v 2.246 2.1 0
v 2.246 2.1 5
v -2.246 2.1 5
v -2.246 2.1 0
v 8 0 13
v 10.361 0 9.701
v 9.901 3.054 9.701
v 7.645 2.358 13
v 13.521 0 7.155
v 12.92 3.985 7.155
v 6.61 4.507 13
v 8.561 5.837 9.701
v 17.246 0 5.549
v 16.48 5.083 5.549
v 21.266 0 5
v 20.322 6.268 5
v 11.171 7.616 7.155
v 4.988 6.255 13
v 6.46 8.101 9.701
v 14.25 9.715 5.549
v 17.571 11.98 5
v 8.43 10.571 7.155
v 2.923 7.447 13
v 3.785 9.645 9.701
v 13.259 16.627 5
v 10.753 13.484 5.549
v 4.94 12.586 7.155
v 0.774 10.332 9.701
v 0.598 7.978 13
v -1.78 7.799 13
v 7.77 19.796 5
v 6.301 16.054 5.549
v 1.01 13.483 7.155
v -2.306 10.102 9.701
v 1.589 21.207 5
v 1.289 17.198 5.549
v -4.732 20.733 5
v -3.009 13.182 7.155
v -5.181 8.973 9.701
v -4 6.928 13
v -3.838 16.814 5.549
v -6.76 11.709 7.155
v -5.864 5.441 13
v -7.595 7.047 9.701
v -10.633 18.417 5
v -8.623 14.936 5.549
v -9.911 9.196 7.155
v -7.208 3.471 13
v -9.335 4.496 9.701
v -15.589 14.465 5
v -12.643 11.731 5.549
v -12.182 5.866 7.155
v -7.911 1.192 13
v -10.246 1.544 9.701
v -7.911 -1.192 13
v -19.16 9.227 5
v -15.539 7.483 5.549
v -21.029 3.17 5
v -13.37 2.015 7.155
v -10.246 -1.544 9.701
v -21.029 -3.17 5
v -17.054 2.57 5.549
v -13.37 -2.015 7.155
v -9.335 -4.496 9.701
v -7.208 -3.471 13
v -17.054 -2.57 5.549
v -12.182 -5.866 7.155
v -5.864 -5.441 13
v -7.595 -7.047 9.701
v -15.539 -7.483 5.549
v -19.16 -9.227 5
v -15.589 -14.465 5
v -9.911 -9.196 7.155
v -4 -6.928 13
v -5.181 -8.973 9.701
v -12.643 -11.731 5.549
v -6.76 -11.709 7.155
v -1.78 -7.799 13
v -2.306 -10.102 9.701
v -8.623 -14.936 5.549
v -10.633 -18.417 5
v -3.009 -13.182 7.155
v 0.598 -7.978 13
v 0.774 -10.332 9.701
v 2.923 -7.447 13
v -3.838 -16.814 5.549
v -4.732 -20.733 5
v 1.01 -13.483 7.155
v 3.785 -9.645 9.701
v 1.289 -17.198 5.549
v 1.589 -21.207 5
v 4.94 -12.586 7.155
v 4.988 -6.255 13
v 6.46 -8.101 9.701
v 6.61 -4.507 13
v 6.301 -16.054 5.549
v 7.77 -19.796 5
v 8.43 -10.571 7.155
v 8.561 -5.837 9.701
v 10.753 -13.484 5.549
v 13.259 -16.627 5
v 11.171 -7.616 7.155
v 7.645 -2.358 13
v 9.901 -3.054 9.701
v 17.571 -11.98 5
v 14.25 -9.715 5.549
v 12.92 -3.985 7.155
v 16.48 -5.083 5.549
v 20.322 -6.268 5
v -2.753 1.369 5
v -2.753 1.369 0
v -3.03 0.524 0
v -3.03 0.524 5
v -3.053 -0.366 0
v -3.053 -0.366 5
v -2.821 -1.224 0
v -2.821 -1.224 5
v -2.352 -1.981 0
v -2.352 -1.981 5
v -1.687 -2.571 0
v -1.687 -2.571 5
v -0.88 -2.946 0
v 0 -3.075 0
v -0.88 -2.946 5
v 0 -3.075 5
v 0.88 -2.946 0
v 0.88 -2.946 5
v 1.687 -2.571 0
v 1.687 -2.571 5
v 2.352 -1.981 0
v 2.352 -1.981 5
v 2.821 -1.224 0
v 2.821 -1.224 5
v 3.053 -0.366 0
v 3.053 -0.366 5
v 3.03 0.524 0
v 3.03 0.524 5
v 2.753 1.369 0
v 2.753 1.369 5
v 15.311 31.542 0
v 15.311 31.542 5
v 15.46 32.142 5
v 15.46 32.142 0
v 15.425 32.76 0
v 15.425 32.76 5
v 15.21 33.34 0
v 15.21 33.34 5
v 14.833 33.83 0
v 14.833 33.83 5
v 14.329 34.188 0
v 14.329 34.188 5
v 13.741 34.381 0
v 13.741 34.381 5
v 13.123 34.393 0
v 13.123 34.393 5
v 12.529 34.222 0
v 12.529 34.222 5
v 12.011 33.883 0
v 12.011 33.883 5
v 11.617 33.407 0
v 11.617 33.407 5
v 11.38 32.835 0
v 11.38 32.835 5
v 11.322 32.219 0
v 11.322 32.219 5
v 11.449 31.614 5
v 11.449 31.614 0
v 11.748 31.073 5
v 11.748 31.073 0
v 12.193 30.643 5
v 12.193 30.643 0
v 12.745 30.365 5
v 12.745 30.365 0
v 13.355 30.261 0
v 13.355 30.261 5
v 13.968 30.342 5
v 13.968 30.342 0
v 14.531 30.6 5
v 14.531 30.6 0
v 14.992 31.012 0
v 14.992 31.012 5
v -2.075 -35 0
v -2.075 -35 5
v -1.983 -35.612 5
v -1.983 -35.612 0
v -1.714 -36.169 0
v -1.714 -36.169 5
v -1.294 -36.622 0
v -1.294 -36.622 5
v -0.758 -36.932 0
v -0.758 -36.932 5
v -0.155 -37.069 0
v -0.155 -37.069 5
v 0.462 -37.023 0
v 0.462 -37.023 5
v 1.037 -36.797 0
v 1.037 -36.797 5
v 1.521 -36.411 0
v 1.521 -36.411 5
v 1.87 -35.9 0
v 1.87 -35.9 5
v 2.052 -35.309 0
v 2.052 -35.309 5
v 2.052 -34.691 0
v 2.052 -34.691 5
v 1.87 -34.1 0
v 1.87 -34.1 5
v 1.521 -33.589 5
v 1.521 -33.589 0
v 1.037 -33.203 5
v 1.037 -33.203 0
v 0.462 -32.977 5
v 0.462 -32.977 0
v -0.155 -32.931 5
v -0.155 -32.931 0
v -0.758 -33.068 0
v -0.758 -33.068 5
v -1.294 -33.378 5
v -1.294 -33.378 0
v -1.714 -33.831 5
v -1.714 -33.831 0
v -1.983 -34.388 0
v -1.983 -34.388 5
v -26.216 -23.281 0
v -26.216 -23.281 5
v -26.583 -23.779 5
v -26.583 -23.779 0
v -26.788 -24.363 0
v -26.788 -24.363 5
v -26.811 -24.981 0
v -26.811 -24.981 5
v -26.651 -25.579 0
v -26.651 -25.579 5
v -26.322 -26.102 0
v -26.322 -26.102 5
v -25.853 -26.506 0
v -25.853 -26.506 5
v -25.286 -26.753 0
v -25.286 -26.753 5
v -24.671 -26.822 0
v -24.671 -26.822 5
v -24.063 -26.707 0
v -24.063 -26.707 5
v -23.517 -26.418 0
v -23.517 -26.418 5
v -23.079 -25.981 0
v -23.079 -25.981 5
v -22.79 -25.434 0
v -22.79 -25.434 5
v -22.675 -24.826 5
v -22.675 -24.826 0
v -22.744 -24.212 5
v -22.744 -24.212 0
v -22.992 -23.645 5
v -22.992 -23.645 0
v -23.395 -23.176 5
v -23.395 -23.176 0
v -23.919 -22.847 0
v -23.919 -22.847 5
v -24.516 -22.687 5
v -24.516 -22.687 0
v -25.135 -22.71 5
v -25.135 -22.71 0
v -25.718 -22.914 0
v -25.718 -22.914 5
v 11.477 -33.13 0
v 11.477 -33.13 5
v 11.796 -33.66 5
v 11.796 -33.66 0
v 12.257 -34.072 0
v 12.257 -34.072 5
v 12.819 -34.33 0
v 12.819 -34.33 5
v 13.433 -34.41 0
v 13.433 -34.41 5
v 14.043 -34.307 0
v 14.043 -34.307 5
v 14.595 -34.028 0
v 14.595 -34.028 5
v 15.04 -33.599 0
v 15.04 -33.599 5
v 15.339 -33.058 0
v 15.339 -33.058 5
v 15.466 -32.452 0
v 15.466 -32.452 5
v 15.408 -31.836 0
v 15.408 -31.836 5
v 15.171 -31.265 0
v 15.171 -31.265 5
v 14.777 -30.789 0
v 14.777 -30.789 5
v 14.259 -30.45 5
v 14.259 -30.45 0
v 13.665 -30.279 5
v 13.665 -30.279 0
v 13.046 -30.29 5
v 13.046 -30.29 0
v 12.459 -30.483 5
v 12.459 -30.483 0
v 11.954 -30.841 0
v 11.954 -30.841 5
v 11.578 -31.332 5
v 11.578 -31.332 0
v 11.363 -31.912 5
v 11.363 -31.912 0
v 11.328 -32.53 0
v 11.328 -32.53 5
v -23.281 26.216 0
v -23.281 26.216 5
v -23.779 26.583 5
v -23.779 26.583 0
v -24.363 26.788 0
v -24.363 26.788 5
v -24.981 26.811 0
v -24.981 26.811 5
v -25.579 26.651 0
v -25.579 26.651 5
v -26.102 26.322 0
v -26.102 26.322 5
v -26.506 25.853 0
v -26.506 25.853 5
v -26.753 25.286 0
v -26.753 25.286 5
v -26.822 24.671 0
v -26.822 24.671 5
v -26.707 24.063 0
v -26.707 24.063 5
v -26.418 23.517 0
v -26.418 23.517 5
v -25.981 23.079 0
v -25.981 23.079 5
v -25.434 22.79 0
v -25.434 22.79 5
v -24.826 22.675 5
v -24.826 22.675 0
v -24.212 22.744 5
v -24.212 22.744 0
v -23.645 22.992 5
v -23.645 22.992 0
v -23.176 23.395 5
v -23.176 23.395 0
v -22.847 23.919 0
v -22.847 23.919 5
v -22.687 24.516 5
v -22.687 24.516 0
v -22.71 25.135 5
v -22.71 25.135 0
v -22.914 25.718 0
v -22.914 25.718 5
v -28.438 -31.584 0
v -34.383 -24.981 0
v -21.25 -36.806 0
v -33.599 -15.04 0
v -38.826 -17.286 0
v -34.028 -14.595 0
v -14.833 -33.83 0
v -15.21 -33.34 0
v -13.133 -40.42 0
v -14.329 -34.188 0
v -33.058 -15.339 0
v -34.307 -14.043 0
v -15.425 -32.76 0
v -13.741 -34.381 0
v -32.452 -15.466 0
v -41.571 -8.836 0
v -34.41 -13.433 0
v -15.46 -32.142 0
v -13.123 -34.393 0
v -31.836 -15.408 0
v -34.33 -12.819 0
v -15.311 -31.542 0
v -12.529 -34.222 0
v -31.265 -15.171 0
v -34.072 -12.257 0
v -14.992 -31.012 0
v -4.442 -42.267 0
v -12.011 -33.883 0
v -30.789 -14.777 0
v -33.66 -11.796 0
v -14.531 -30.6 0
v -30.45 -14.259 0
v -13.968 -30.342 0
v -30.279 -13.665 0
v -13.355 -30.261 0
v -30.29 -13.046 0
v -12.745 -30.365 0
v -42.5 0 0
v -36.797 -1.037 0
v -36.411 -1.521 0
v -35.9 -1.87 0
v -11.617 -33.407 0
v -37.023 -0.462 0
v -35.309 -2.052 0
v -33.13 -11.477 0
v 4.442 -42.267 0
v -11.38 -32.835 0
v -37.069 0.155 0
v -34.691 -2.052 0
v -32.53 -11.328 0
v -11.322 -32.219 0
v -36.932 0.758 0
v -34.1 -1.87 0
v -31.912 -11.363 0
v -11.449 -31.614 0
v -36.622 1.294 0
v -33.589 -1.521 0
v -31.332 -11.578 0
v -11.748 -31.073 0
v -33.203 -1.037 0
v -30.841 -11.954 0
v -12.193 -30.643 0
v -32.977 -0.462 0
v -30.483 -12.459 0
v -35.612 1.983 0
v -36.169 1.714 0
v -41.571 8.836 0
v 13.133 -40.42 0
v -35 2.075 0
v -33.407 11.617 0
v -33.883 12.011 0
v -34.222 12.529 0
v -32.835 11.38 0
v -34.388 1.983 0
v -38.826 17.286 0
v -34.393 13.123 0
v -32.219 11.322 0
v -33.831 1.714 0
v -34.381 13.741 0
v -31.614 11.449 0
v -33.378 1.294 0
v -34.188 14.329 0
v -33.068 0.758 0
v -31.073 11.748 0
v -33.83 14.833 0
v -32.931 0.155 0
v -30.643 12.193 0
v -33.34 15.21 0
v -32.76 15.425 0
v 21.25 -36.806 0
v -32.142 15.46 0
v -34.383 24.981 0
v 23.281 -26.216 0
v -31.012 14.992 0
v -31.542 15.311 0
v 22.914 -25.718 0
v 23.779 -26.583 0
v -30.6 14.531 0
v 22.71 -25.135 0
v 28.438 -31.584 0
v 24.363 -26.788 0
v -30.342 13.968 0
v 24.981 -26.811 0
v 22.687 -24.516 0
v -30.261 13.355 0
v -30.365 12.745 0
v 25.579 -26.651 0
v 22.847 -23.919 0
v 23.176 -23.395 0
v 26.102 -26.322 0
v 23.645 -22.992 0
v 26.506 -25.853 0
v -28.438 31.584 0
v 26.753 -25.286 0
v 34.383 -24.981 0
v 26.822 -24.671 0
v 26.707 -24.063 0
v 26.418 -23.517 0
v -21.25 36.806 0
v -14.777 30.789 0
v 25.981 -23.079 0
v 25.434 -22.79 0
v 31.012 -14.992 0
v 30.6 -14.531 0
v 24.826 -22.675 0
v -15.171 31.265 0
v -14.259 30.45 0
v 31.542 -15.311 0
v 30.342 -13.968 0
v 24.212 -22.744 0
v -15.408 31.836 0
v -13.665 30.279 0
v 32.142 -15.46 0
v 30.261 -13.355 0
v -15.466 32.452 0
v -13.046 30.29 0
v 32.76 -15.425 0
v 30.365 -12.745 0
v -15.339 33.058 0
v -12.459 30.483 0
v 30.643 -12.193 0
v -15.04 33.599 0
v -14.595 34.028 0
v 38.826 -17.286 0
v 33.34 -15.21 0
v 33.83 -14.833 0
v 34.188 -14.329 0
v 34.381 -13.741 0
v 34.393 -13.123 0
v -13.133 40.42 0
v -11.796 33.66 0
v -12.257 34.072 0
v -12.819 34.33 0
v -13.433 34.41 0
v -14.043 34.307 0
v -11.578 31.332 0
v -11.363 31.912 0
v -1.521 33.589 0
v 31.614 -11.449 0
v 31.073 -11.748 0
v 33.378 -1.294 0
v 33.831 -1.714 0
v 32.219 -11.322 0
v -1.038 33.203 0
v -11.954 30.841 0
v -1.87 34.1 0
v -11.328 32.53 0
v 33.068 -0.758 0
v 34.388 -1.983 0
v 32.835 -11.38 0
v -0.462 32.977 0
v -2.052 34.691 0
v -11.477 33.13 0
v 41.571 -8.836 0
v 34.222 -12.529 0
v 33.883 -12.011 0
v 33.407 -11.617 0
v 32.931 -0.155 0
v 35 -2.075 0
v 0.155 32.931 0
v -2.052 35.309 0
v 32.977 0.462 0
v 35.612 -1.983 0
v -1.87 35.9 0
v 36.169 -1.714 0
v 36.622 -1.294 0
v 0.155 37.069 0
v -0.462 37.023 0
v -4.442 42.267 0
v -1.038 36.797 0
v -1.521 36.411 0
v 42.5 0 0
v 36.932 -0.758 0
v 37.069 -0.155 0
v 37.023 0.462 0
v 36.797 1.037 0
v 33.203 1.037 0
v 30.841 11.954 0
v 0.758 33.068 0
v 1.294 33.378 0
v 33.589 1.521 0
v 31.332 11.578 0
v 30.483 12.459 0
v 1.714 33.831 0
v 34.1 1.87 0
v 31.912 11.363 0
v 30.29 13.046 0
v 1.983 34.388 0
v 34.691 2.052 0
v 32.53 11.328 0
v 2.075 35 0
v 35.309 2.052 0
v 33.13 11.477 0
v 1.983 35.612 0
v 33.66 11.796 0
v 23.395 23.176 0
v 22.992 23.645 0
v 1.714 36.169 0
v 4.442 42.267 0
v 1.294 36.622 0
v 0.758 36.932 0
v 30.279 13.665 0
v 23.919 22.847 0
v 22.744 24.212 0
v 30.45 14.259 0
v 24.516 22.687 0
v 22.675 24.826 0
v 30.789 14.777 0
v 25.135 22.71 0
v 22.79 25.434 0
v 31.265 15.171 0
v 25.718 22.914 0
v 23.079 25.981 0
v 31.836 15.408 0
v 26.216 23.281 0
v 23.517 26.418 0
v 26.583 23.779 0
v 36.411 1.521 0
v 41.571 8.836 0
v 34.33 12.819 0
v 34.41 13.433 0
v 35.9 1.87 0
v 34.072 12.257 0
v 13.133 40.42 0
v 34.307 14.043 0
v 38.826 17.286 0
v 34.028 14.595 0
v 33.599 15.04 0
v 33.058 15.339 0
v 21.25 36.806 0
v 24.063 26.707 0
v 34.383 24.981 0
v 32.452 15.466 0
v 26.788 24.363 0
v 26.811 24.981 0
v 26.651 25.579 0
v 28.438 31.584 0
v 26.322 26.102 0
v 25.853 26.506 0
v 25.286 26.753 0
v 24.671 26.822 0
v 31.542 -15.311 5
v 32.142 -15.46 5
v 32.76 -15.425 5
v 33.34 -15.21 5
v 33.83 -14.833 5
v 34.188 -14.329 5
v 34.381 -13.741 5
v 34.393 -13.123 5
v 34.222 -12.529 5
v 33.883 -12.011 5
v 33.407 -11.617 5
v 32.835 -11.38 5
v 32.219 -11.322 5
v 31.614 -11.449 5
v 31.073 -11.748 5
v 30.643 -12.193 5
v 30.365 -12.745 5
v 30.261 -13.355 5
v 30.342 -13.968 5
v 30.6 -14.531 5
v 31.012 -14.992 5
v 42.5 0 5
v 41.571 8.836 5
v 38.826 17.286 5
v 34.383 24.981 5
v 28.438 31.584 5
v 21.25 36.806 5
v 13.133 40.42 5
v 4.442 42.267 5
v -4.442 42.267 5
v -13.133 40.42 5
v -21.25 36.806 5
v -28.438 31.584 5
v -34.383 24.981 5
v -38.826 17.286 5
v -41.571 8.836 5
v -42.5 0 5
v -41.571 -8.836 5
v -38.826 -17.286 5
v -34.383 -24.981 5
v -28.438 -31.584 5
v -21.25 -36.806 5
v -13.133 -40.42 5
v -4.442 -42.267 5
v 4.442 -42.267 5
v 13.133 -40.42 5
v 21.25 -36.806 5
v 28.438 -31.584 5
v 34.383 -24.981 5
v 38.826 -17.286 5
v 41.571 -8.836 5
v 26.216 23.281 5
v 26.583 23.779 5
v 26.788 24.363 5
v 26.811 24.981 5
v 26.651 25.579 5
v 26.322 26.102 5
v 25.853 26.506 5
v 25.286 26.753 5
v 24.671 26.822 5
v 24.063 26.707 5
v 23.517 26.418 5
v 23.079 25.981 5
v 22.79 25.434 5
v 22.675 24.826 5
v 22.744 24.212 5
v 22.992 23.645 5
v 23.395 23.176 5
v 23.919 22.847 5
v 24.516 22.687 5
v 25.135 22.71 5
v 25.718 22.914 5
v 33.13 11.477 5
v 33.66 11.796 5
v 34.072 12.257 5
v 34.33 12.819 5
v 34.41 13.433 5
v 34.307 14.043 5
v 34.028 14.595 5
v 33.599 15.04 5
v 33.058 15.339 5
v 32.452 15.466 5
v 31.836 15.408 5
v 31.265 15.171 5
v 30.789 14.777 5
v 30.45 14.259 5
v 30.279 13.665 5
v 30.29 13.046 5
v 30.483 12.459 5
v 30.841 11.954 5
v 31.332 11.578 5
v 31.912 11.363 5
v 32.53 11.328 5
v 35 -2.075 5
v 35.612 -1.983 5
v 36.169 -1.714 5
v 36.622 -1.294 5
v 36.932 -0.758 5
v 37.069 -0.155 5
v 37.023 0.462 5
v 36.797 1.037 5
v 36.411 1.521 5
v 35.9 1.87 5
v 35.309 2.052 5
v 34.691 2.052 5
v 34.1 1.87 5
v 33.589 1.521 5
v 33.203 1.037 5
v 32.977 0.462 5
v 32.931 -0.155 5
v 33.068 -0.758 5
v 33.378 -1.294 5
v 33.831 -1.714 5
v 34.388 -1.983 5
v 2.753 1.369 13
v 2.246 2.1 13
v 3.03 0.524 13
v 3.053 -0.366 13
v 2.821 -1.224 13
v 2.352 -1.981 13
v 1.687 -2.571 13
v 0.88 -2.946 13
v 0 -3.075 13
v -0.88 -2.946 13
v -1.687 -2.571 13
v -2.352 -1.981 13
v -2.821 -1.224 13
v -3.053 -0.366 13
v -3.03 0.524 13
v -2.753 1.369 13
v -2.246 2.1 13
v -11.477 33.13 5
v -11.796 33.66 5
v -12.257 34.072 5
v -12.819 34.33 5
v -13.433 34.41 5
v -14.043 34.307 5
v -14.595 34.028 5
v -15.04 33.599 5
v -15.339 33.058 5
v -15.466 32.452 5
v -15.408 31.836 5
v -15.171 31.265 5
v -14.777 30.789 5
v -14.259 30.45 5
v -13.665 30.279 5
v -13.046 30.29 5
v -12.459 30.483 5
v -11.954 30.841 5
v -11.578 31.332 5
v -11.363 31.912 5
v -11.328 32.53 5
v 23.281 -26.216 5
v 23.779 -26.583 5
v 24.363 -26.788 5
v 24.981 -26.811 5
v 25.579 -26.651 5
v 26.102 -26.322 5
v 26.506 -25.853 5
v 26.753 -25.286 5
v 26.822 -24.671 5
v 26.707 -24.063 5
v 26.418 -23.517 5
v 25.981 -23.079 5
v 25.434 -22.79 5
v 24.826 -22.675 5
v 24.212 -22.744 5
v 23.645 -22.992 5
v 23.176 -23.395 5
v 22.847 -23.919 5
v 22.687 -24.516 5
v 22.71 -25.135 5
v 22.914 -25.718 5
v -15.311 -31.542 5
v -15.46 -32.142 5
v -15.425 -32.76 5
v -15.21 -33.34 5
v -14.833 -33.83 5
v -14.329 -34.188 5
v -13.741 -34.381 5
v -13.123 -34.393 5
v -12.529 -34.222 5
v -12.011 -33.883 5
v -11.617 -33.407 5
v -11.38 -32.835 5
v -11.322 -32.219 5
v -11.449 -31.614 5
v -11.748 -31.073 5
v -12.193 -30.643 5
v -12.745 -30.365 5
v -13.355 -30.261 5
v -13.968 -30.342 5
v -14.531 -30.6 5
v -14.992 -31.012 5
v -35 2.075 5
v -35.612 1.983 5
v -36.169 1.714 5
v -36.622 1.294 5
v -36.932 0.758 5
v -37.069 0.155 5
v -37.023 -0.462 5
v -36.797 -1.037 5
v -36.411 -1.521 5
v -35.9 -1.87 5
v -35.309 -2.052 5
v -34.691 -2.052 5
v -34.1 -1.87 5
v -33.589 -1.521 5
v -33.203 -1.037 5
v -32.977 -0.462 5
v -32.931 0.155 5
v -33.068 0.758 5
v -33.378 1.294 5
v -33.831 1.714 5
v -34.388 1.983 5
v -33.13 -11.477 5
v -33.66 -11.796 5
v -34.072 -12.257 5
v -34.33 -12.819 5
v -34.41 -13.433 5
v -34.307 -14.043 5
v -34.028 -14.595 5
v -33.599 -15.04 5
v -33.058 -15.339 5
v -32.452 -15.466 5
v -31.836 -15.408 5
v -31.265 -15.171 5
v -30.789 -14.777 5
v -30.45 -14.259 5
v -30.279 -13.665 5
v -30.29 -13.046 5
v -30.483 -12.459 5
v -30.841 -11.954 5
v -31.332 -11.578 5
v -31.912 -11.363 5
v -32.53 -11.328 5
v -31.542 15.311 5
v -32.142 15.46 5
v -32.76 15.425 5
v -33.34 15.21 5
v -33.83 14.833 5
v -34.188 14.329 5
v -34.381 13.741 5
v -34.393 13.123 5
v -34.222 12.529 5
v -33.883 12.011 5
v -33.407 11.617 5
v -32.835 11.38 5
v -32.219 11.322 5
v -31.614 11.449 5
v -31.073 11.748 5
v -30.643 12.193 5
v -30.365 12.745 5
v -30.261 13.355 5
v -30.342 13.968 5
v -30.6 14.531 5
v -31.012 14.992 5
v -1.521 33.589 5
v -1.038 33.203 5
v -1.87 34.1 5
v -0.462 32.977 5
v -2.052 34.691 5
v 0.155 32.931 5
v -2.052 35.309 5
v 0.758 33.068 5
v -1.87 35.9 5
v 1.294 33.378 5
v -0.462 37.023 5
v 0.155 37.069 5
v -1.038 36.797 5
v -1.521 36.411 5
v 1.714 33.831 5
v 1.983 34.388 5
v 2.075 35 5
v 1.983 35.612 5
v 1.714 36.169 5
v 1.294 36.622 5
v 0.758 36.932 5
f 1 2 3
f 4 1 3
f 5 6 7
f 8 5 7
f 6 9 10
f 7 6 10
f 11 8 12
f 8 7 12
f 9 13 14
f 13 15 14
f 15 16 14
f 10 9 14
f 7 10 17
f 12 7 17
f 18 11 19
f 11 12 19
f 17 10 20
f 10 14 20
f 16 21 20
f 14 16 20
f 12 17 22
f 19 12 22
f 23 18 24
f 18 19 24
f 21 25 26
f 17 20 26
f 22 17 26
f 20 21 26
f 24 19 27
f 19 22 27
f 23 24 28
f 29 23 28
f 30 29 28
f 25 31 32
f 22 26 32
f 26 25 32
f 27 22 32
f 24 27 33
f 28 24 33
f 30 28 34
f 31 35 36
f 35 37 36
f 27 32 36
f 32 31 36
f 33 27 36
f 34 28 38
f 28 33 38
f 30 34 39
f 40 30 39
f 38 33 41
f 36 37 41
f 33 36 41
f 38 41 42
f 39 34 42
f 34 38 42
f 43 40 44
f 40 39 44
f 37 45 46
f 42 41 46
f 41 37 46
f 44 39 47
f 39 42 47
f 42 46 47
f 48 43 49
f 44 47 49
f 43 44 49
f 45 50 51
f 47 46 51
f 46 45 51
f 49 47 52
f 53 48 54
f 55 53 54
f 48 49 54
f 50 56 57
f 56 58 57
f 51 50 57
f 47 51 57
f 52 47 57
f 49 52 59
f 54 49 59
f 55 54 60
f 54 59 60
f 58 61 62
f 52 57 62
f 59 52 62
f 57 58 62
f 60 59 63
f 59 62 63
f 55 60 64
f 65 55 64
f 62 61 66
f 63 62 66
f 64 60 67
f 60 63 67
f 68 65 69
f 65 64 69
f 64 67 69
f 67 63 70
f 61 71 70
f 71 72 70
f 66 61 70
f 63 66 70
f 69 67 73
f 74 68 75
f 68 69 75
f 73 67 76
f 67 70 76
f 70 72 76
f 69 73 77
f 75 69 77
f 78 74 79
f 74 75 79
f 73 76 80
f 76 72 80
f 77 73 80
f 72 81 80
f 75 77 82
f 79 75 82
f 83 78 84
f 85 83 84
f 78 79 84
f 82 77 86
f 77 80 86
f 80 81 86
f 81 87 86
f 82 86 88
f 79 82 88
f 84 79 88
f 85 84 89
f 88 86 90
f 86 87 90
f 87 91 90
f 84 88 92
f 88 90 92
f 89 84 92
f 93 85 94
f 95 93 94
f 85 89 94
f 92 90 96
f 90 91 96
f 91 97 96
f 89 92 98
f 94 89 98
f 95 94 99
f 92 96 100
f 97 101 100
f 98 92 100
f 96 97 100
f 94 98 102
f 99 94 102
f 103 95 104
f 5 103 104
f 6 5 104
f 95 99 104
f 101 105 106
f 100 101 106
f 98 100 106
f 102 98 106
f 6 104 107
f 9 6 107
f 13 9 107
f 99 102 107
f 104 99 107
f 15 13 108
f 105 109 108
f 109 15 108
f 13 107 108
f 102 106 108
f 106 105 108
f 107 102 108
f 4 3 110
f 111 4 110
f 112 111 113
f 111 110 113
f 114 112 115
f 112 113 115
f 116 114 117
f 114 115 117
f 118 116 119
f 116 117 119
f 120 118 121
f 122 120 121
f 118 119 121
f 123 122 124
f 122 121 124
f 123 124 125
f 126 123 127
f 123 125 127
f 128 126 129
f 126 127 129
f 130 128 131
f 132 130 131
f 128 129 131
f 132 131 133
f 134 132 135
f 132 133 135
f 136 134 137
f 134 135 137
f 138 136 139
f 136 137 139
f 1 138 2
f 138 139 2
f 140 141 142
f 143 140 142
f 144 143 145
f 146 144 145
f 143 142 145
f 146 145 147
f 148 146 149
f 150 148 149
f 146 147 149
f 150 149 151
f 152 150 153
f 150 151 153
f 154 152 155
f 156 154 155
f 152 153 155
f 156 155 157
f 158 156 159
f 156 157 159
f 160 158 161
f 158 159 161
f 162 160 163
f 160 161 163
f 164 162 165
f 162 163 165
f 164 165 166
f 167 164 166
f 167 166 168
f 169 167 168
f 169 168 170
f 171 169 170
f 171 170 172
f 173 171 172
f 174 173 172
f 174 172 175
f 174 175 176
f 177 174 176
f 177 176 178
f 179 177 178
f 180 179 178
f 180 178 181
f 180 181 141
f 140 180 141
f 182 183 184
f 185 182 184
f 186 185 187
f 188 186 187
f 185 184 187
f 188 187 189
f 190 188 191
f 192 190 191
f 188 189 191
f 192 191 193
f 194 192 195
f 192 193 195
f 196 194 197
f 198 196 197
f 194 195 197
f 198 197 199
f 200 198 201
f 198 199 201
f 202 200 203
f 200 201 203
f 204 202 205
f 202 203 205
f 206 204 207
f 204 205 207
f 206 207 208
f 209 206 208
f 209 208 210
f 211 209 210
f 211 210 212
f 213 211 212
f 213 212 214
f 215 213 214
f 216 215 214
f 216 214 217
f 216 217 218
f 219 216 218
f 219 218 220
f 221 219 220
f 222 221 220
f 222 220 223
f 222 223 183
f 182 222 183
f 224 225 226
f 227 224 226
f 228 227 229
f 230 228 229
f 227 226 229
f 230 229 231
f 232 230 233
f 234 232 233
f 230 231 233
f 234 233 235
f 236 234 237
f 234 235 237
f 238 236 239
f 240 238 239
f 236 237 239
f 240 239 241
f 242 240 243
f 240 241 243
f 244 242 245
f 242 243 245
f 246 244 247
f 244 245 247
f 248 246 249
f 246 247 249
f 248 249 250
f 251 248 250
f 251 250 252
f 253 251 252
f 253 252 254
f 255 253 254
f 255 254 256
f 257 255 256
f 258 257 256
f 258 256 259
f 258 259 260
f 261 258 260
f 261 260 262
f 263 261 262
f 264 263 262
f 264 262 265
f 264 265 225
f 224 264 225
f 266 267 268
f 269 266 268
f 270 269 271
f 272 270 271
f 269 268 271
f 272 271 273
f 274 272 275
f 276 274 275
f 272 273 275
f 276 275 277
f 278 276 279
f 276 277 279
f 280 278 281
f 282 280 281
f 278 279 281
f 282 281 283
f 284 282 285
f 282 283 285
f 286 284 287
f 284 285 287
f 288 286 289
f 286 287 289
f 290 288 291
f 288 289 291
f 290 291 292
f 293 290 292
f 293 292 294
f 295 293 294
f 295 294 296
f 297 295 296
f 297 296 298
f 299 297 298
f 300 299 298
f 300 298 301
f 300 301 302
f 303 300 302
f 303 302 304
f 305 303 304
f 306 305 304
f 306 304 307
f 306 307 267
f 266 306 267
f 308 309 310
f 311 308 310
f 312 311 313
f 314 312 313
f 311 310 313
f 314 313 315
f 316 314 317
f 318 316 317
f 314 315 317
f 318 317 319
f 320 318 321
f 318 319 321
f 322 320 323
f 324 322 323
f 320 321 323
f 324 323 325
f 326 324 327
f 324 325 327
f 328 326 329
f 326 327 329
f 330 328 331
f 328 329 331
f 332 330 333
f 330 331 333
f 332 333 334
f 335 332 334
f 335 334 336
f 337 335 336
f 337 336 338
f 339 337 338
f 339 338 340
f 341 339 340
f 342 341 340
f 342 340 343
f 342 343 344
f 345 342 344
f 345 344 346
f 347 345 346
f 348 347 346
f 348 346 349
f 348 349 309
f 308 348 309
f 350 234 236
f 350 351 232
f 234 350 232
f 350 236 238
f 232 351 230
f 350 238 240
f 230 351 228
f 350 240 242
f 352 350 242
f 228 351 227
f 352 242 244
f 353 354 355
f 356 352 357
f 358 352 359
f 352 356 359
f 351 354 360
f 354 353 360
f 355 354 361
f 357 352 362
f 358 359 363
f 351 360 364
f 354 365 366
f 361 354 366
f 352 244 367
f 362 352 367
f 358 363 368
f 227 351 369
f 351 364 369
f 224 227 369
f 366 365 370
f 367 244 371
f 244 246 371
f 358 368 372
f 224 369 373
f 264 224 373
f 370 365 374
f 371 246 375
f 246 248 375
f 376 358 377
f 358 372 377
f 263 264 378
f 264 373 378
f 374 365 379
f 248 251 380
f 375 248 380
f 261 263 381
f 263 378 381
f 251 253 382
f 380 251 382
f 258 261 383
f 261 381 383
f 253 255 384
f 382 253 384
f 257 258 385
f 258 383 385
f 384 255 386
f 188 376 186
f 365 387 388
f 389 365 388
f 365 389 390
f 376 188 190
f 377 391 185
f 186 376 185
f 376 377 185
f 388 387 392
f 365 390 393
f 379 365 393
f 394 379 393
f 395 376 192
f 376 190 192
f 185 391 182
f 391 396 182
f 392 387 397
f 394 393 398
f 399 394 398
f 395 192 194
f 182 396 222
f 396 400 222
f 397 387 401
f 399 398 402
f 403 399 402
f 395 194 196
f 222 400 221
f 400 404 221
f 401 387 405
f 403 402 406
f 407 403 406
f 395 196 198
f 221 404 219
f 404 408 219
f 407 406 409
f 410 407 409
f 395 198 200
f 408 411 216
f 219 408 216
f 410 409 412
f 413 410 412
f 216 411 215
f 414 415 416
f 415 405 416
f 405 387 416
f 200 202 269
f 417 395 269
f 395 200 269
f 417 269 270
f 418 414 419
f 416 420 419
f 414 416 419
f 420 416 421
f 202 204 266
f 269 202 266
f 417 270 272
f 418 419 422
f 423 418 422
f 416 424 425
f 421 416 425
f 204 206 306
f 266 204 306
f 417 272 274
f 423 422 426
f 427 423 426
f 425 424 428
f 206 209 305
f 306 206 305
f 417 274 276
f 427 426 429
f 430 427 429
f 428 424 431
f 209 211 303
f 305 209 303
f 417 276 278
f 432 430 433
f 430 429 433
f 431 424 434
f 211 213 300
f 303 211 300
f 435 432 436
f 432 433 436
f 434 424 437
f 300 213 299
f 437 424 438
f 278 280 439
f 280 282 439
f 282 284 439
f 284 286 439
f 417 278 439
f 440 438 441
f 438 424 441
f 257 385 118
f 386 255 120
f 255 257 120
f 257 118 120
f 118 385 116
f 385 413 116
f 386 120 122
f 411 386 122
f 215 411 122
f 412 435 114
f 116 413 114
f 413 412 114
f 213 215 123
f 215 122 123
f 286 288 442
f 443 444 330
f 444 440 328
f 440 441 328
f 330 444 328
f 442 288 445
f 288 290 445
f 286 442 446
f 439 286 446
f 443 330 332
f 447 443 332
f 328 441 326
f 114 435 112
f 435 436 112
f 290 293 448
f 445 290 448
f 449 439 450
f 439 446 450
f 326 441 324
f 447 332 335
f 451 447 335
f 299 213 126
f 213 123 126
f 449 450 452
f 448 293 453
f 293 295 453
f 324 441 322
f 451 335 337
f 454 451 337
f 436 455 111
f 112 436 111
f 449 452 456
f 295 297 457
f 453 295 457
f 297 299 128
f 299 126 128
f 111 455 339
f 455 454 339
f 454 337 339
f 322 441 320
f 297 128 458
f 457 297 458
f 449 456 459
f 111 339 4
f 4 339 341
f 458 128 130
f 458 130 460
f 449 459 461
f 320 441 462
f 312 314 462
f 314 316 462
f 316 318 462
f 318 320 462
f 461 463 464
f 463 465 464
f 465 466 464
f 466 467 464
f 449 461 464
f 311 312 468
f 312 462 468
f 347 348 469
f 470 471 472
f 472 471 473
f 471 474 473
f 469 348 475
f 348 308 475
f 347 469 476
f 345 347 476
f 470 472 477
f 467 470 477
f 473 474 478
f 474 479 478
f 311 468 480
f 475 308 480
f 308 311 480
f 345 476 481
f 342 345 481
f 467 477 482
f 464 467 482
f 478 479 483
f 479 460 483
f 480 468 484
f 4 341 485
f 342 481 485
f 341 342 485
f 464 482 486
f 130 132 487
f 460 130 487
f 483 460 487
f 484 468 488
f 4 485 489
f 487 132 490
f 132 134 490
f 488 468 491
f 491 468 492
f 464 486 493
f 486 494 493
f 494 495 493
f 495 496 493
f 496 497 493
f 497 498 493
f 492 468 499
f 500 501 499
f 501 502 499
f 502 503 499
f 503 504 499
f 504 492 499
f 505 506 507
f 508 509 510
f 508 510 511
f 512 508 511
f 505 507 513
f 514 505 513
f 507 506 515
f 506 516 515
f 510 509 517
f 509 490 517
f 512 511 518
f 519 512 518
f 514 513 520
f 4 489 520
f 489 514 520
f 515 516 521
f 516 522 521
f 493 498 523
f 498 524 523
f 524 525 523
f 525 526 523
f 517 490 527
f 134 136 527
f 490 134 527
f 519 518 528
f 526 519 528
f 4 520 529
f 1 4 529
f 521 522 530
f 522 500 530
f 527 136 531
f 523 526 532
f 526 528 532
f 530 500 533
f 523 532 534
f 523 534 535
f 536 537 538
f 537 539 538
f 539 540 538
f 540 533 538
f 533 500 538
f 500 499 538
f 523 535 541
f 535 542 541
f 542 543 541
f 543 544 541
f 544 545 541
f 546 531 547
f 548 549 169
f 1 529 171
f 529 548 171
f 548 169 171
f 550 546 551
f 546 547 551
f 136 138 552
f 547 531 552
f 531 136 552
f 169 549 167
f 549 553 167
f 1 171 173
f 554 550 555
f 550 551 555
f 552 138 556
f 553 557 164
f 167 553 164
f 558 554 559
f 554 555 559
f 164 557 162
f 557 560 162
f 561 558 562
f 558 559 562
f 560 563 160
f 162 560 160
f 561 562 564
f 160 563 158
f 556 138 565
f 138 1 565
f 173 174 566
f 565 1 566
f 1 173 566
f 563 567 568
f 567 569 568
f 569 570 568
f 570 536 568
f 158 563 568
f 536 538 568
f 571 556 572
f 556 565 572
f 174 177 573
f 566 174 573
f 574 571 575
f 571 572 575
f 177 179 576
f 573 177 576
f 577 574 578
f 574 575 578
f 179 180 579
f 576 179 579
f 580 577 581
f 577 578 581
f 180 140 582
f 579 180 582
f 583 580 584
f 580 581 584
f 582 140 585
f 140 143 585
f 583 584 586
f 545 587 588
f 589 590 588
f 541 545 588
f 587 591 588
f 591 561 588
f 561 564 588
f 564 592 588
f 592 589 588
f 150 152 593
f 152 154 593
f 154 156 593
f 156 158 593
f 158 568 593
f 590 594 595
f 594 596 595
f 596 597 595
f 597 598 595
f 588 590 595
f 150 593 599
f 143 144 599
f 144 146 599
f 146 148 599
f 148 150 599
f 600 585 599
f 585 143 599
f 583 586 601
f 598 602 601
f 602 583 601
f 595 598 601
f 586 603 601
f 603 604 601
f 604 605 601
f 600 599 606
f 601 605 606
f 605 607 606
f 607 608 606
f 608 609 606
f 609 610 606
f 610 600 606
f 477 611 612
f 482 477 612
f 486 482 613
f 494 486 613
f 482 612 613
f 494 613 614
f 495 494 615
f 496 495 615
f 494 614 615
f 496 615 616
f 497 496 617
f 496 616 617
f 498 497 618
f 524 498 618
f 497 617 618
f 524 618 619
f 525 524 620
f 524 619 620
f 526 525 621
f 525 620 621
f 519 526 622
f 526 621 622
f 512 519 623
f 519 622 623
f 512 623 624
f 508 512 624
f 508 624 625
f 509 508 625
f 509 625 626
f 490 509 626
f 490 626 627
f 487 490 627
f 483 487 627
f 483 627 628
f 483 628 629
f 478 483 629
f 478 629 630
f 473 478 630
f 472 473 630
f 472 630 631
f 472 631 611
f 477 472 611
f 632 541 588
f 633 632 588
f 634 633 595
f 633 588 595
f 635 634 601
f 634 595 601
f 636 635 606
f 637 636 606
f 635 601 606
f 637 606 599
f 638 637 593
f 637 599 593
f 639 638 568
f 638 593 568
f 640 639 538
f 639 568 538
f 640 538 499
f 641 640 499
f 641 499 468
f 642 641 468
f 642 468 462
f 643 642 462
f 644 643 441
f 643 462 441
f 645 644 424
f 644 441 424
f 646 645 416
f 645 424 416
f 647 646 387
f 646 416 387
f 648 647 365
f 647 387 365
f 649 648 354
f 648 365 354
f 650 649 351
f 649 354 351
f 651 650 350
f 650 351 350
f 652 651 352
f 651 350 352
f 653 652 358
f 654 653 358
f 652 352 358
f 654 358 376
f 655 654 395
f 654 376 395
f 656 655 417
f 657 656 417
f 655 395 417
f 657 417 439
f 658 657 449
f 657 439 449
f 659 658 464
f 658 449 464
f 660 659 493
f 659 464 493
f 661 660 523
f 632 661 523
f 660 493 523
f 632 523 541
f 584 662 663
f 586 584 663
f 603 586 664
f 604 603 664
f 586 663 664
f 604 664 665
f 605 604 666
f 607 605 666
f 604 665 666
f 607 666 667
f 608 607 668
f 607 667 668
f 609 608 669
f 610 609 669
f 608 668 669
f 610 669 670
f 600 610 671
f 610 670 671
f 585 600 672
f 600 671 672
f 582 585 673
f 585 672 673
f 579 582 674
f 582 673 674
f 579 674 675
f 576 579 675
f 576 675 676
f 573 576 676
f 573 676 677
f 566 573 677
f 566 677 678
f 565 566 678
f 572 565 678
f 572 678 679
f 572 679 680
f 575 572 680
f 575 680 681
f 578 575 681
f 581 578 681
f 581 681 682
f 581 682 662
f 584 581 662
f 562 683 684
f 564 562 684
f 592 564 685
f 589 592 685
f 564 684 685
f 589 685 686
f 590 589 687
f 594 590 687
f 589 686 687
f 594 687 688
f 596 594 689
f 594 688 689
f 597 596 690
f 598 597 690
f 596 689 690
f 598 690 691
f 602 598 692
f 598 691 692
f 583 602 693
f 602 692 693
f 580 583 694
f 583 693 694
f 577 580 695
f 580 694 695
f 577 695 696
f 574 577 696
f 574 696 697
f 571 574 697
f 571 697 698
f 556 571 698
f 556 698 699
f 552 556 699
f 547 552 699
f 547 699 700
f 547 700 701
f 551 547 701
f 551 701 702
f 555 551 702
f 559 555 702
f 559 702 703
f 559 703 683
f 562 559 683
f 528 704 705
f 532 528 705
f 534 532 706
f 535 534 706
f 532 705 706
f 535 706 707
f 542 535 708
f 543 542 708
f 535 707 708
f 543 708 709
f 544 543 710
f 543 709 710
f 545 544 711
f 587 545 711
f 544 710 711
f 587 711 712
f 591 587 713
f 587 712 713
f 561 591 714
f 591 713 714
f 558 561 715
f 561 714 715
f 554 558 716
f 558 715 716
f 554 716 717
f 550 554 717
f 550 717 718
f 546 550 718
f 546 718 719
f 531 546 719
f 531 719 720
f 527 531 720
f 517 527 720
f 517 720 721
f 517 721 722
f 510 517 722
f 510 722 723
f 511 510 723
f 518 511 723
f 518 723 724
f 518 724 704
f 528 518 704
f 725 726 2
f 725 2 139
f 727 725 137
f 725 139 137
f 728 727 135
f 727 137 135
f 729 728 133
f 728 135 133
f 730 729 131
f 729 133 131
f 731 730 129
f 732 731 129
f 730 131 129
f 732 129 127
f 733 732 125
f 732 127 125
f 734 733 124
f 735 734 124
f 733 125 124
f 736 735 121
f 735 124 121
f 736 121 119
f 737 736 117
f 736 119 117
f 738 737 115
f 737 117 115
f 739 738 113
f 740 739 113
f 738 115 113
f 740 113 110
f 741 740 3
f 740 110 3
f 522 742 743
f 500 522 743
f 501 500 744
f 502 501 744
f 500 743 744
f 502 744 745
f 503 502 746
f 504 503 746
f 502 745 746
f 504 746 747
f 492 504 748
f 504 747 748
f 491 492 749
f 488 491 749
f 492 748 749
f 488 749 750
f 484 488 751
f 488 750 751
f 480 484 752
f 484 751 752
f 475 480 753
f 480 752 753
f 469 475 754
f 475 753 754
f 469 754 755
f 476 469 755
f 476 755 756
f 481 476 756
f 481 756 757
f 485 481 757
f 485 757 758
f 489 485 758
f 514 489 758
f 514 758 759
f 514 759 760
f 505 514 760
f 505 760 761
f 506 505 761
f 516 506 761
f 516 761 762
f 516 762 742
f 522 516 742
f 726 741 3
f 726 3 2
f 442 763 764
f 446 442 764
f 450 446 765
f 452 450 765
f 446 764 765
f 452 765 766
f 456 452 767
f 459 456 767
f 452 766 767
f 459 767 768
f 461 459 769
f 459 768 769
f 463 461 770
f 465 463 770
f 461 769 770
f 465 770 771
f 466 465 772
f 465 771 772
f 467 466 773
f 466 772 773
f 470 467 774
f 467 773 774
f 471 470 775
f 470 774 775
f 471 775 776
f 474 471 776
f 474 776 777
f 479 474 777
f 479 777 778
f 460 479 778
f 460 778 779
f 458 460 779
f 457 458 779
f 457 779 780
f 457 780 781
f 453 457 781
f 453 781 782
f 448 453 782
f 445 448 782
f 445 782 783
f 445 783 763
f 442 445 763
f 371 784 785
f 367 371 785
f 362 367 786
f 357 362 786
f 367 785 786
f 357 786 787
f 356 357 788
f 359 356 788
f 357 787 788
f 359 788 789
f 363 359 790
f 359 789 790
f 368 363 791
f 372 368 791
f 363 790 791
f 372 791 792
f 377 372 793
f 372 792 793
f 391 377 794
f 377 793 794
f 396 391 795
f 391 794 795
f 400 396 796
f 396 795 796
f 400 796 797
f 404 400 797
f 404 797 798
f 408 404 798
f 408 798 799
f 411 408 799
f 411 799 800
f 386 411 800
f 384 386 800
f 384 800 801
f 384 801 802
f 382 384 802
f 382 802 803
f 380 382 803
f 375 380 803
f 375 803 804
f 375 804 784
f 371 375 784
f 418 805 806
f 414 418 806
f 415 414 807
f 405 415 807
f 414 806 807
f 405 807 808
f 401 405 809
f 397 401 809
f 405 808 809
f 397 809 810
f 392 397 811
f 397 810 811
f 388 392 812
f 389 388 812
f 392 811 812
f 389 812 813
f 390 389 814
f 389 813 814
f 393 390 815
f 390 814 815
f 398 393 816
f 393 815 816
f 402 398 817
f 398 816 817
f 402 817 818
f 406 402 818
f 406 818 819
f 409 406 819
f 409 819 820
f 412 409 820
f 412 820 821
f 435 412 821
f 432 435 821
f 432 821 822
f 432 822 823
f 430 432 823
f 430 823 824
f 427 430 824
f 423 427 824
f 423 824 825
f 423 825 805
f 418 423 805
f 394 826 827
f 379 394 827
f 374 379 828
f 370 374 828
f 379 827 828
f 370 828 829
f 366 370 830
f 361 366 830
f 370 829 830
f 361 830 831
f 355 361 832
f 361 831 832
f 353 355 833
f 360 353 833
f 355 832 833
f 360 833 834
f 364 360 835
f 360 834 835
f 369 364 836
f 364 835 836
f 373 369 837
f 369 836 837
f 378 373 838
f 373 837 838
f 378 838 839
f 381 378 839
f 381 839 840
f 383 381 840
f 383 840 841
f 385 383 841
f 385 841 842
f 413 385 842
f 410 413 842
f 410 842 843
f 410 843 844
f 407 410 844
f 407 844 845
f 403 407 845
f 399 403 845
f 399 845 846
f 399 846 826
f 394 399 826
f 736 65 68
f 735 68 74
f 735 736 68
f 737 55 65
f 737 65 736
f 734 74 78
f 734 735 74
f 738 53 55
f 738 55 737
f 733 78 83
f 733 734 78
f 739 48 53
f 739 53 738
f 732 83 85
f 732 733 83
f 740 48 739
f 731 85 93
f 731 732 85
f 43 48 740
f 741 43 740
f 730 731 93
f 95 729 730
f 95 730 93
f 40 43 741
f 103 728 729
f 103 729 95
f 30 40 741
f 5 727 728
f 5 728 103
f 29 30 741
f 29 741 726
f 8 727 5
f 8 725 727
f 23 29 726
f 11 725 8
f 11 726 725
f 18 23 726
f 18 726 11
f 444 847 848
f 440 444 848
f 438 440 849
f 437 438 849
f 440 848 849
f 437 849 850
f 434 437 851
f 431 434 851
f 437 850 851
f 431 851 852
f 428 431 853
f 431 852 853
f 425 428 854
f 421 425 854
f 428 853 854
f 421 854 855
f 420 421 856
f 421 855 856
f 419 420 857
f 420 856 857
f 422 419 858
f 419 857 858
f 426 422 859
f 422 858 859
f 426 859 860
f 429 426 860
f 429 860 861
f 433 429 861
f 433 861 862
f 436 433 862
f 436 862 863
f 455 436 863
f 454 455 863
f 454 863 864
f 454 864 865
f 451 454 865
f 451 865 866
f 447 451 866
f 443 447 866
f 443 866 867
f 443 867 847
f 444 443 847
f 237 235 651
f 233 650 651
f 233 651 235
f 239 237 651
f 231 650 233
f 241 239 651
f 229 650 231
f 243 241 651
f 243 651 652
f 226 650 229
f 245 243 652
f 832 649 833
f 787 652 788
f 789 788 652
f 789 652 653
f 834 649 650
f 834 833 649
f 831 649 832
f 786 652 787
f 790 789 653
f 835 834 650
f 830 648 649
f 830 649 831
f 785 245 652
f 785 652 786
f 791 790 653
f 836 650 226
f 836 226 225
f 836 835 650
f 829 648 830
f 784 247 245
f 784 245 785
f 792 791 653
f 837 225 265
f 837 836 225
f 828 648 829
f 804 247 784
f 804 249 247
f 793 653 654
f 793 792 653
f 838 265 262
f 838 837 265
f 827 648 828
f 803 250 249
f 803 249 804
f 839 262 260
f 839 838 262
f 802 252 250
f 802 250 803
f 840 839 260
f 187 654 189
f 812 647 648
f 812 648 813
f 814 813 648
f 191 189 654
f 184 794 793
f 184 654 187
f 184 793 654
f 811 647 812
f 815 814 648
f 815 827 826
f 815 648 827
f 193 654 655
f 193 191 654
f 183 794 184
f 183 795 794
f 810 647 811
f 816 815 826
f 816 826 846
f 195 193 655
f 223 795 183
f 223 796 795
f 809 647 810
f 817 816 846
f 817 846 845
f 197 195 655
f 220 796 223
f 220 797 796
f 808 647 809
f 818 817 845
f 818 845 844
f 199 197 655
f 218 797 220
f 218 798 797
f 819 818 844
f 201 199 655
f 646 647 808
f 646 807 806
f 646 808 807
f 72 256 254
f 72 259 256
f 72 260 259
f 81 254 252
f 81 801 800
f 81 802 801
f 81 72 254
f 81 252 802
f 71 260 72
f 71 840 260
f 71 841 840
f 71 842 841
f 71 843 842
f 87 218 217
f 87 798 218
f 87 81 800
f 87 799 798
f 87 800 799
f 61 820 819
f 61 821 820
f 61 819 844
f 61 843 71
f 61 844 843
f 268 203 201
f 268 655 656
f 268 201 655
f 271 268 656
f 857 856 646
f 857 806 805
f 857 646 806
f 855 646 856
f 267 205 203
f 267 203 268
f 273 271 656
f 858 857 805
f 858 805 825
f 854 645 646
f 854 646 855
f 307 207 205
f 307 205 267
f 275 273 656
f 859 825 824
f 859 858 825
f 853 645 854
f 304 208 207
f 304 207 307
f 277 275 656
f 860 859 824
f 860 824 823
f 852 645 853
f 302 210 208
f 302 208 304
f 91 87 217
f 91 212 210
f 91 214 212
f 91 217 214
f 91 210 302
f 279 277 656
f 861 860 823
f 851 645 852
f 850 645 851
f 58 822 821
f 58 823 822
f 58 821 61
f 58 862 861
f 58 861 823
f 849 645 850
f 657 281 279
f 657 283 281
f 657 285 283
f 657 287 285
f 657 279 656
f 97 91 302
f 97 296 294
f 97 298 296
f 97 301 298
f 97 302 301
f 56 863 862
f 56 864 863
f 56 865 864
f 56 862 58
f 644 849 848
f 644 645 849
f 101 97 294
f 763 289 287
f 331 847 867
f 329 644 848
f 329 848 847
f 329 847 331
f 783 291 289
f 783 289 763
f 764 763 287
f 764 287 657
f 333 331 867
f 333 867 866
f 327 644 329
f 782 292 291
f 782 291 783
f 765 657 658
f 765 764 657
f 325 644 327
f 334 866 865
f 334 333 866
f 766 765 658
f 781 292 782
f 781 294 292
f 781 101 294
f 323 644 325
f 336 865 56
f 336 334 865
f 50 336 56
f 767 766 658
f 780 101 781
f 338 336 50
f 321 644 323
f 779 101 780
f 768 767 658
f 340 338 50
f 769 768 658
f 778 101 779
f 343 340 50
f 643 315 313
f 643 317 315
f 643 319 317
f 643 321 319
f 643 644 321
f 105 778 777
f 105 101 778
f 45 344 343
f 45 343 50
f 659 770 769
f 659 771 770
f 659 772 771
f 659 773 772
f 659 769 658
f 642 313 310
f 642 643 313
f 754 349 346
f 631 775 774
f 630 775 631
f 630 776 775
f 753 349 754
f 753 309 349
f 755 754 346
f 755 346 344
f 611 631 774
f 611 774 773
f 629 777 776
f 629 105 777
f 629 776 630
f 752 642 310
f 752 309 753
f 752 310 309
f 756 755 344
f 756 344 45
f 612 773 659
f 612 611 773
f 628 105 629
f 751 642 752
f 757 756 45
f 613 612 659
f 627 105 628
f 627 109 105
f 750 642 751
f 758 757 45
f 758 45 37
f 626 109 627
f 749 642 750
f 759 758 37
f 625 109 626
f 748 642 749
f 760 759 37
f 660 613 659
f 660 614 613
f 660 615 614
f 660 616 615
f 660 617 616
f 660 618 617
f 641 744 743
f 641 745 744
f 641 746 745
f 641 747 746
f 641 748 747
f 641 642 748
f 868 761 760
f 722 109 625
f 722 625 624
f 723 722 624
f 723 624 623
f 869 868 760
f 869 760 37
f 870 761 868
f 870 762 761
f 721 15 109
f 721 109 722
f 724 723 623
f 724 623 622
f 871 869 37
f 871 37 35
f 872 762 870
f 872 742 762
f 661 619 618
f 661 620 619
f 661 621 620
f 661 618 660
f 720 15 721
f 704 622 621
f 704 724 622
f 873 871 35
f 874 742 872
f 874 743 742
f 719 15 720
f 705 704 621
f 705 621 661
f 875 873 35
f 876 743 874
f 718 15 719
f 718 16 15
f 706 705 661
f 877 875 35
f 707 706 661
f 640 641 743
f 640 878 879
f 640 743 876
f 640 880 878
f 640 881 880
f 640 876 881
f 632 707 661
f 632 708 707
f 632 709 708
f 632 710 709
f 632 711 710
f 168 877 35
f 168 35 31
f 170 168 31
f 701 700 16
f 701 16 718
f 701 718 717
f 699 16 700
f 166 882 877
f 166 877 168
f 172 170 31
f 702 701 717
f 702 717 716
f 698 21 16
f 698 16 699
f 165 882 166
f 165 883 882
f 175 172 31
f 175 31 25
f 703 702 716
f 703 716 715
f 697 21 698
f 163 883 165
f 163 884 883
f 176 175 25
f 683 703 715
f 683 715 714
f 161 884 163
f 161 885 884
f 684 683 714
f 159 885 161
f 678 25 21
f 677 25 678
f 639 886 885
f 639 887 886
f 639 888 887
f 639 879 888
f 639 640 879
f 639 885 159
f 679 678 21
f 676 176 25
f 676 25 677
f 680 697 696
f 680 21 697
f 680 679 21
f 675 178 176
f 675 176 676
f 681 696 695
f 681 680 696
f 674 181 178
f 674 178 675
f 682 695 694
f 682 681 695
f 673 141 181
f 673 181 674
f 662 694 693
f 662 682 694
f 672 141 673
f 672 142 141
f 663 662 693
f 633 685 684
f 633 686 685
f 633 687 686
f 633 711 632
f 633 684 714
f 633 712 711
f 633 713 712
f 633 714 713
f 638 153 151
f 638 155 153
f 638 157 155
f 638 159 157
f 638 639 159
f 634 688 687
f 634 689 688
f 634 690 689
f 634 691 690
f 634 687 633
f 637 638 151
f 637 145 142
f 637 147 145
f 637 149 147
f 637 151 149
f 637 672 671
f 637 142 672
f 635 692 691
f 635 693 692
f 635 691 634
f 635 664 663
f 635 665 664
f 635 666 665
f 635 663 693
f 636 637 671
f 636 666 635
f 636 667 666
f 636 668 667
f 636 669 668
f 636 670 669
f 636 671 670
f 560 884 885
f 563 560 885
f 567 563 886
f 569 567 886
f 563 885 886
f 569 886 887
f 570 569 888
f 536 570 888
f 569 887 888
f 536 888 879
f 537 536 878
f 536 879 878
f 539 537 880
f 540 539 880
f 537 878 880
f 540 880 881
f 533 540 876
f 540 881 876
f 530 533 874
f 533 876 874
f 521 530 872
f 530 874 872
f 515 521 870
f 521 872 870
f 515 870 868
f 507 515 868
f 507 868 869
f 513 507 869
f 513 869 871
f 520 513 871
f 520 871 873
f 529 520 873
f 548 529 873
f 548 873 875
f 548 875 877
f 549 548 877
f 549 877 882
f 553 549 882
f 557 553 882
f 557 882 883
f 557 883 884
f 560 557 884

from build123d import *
from build123d.topology import SkipClean

# Parameters (mm, degrees)
ESBO_O1_R                = 42.5
RESSALTO_EXTRUS_O1_DEPTH = 5
ESBO_O2_R                = 8
RESSALTO_EXTRUS_O2_DEPTH = 8
FILETE3_R                = 15
ESBO_O3_R                = 2.075
CORTE_EXTRUS_O1_DEPTH    = 61.634148794
PADR_OCIRCULAR1_COUNT    = 16
CORTE_EXTRUS_O2_DEPTH    = 61.634148794


with BuildPart() as part:
    # Esboço1 → Ressalto-extrusão1 (new body)
    with BuildSketch(Plane.XY):
        Circle(ESBO_O1_R)
    extrude(amount=RESSALTO_EXTRUS_O1_DEPTH)

    # Esboço2 → Ressalto-extrusão2 (add)
    with BuildSketch(Plane.XY.offset(5)):
        Circle(ESBO_O2_R)
        with BuildLine():
            Line((-2.24624687, 2.1), (2.24624687, 2.1))
            ThreePointArc((2.24624687, 2.1), (0, -3.075), (-2.24624687, 2.1))
        make_face(mode=Mode.SUBTRACT)
    extrude(amount=RESSALTO_EXTRUS_O2_DEPTH)

    # Filete3
    # the kernel refuses this fillet: 15 mm, written as the material it adds along each edge
    with BuildSketch(Plane(origin=(0, 0, 5), x_dir=(1, 0, 0), z_dir=(0, -1, 0))) as filete3_piece_1:
        with BuildLine():
            CenterArc((21.266499161, 15), FILETE3_R, 207.818139285, 62.181860715)
            Line((8, 8), (7.734670017, 7.86))
            ThreePointArc((7.734670017, 7.86), (7.7, 4), (7.7, 0))
            Line((7.7, 0), (8, -0.3))
            Line((8, -0.3), (21.266499161, -0.3))
            Line((21.266499161, -0.3), (21.266499161, 0))
        make_face()
    revolve(axis=Axis((0, 0, 5), (0, 0, 1)))

    # Esboço3 → Corte-extrusão1 (cut, through all)
    with BuildSketch(Plane.XY.offset(5)):
        with Locations((0, 35)):
            Circle(ESBO_O3_R)
    corte_extrus_o1 = extrude(amount=-CORTE_EXTRUS_O1_DEPTH, mode=Mode.SUBTRACT)

    # PadrãoCircular1: Corte-extrusão1 ×16 about axis
    padr_ocircular1_axis = Axis((0, 0, 0), (0, 0, 1))
    for i in range(1, PADR_OCIRCULAR1_COUNT):
        add(corte_extrus_o1.rotate(padr_ocircular1_axis, i * 360 / PADR_OCIRCULAR1_COUNT), mode=Mode.SUBTRACT)

    # Esboço4 → Corte-extrusão2 (cut, through all)
    with SkipClean():  # the faces are left unmerged after this step: merging them gives an invalid solid
        with BuildSketch(Plane.XY.offset(5)):
            with BuildLine():
                Line((2.24624687, 2.1), (-2.24624687, 2.1))
                ThreePointArc((-2.24624687, 2.1), (0, -3.075), (2.24624687, 2.1))
            make_face()
        extrude(amount=-CORTE_EXTRUS_O2_DEPTH, mode=Mode.SUBTRACT)
    add(part.part.scale(1), mode=Mode.REPLACE)  # the faces are merged on a copy


solid = part.part
